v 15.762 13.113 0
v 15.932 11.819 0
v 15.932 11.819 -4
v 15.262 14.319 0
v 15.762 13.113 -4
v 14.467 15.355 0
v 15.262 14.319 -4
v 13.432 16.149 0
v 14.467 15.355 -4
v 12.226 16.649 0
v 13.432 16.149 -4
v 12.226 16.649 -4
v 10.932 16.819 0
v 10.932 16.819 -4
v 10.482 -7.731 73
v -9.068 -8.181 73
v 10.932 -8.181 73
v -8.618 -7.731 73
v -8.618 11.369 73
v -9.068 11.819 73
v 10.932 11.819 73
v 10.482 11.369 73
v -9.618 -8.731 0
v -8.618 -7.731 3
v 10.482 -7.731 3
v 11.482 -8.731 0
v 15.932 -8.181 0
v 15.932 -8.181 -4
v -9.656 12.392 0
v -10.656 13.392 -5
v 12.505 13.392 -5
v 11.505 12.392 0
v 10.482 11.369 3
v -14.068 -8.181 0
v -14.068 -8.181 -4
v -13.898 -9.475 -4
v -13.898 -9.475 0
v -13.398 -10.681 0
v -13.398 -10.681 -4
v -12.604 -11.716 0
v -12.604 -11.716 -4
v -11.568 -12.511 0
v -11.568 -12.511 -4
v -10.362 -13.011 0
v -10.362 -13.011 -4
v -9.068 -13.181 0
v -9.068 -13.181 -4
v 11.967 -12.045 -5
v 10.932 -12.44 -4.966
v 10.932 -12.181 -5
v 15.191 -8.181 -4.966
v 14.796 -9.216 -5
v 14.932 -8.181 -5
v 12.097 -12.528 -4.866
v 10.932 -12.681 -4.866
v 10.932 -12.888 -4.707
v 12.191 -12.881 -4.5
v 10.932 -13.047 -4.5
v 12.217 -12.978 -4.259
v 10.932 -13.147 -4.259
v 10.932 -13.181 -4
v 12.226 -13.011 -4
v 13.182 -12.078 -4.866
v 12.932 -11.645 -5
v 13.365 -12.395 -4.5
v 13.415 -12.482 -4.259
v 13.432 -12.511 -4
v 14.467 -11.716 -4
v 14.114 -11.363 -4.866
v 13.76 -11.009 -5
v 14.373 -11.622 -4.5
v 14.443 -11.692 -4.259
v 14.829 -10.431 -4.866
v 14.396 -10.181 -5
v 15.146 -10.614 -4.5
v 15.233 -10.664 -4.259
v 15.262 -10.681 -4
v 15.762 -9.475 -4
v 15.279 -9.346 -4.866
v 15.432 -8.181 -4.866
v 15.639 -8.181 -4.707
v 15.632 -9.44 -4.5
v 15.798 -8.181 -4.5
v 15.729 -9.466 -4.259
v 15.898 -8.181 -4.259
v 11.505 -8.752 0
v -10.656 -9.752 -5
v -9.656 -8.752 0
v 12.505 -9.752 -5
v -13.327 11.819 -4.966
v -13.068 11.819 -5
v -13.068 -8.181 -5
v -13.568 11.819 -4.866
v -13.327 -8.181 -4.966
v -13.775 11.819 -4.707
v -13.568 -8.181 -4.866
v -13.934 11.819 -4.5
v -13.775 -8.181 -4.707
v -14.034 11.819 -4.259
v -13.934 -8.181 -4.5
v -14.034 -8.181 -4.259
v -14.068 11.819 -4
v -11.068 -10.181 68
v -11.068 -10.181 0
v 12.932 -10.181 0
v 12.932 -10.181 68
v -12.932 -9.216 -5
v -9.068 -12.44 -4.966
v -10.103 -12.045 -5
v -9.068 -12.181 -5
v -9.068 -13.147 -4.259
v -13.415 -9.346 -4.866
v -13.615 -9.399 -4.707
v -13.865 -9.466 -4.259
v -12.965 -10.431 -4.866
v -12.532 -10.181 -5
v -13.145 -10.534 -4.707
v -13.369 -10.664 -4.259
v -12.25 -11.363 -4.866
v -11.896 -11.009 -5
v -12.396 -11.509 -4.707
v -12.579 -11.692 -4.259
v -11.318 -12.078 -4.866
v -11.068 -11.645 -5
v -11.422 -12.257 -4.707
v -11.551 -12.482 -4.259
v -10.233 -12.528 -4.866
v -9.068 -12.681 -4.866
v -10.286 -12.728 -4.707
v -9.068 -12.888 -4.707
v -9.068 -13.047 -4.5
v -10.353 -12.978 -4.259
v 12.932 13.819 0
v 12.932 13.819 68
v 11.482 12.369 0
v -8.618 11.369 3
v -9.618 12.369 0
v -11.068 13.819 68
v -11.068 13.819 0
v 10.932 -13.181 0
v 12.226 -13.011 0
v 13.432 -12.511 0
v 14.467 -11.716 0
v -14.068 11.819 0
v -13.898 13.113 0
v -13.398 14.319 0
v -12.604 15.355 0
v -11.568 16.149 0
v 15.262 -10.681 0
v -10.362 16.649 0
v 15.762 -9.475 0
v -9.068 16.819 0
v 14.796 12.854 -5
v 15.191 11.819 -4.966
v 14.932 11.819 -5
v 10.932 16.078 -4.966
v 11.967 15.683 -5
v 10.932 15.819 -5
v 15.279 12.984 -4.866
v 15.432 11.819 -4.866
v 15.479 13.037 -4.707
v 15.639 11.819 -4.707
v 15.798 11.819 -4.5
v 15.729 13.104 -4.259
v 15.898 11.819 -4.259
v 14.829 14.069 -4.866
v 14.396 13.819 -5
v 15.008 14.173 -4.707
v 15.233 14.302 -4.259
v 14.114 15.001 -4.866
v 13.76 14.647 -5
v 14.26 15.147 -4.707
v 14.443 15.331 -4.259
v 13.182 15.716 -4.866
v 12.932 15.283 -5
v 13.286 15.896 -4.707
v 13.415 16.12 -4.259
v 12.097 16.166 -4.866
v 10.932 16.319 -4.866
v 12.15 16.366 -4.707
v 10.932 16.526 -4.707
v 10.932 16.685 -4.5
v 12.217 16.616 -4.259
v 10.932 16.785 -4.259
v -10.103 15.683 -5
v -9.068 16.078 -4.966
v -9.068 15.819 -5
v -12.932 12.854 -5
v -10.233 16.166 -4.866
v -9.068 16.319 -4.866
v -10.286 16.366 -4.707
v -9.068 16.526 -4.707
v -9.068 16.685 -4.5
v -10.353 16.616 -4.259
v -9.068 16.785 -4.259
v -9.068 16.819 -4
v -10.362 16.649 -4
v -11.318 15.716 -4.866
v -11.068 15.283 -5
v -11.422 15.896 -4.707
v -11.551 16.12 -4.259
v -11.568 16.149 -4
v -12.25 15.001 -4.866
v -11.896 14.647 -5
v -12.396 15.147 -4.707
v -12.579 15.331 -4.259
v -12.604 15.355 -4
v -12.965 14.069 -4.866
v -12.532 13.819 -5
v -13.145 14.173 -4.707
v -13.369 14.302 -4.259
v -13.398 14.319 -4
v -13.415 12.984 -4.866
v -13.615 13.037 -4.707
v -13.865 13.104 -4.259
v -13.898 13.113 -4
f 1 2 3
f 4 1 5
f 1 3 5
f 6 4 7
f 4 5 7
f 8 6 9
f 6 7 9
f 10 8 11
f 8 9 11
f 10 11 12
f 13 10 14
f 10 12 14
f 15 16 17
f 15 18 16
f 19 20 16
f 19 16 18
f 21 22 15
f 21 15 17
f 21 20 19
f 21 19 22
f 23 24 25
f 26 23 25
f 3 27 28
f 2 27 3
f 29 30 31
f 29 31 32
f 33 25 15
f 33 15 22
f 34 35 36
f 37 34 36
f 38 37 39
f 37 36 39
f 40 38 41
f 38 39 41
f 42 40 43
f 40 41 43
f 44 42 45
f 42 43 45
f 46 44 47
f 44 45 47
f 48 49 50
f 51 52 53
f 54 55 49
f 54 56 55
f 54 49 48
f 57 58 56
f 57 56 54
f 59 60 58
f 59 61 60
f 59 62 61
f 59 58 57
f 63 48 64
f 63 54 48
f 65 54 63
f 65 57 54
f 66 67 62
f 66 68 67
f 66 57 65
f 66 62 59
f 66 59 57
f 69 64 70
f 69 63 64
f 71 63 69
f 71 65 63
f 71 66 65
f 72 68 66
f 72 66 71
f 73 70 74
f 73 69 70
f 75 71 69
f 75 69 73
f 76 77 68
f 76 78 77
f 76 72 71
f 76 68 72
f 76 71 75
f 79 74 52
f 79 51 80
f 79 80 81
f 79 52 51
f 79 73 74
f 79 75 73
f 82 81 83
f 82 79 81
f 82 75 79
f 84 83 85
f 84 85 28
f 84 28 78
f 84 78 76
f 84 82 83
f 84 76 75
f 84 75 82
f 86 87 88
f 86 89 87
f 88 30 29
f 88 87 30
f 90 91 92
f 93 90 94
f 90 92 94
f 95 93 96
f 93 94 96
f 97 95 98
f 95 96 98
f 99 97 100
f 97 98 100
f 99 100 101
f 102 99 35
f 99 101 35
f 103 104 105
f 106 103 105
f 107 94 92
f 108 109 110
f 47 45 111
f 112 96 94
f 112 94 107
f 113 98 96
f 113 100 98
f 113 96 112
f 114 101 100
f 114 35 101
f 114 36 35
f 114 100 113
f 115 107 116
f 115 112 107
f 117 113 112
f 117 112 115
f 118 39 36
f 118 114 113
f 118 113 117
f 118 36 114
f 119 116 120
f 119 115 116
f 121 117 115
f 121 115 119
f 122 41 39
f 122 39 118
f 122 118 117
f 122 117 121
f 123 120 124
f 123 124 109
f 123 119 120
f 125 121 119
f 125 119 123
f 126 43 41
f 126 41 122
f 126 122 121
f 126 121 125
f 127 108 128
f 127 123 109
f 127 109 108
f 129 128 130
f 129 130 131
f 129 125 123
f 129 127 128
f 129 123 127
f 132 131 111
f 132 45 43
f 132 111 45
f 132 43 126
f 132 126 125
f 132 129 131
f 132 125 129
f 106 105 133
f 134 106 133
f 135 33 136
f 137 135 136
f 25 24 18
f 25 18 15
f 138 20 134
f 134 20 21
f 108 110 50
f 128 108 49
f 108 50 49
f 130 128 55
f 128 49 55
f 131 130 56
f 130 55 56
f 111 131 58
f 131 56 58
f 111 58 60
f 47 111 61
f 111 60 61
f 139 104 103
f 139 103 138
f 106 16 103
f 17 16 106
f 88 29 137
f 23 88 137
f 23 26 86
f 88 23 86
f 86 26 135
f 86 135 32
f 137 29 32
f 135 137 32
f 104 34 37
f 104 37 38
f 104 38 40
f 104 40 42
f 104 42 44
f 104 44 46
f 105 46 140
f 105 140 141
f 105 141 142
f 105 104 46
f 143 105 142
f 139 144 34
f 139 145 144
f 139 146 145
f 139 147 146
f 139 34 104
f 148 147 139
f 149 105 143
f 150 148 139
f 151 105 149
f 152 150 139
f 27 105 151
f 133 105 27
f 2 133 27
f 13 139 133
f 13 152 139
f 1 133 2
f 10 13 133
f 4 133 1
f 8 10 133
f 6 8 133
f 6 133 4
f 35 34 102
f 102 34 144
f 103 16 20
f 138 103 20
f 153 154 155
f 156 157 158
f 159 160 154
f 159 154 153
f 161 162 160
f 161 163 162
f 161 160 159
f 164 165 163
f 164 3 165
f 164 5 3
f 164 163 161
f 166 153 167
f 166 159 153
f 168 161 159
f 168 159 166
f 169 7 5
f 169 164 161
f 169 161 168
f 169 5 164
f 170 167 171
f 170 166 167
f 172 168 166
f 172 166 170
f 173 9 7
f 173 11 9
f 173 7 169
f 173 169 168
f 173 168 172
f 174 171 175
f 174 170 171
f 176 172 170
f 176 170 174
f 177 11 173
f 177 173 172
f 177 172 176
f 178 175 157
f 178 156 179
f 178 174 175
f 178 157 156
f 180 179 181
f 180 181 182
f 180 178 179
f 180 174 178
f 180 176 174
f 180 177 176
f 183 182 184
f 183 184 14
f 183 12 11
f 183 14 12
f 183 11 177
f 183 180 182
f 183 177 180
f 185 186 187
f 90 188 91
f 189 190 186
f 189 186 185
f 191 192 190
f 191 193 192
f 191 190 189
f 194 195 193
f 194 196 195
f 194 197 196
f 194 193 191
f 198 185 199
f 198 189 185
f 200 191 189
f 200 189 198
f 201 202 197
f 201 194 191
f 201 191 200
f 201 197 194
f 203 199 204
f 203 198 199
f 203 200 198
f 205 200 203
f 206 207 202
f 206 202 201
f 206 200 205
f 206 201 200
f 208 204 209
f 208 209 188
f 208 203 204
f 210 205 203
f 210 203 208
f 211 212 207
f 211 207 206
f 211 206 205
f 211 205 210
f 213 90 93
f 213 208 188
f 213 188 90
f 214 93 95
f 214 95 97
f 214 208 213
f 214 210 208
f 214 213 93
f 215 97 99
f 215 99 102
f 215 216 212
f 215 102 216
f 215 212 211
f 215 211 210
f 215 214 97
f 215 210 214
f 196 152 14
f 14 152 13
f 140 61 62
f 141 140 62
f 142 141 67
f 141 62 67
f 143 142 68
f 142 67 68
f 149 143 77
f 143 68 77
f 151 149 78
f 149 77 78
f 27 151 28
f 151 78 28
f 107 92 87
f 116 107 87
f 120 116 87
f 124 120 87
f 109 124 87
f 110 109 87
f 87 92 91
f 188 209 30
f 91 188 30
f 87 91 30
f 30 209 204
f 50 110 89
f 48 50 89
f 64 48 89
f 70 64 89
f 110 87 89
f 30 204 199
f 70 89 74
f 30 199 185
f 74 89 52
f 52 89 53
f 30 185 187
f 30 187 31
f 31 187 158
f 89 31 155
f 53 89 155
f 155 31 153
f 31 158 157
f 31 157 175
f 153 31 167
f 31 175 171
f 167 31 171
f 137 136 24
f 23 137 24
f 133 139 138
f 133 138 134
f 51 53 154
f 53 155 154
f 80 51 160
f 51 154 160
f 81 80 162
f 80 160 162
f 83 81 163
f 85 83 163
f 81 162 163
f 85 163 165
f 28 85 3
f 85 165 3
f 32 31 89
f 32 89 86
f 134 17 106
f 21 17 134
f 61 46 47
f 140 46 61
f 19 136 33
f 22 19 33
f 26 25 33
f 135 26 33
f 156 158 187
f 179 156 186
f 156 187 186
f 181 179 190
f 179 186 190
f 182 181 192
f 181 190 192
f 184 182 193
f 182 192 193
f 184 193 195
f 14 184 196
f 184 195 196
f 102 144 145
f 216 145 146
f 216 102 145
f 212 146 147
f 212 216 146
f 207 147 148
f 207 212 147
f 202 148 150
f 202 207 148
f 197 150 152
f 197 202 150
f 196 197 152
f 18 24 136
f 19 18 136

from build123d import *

# Parameters (mm, degrees)
F0_W         = 24
F0_H         = 24
F0_W_2       = 19.1
F0_H_2       = 19.1
F1_DEPTH     = 73
F2_W         = 30
F2_H         = 30
F2_W_2       = 19.1615689546
F2_H_2       = 19.1443199292
F3_DEPTH     = 5
F4_T4_DEPTH  = 19.1615689546
F4_T9_DEPTH  = 19.1443199292
F4_T14_DEPTH = 19.1615689546
F4_T19_DEPTH = 19.1443199292
F4_T25_DEPTH = 45.1428898176
F4_T30_DEPTH = 45.1256407922
F4_T38_DEPTH = 45.1428898176
F4_T43_DEPTH = 45.1256407922
F4_T51_DEPTH = 45.1428898176
F4_T56_DEPTH = 45.1256407922
F4_T64_DEPTH = 45.1256407922
F4_T69_DEPTH = 45.1428898176
F5_SIZE2     = 3
F5_SIZE      = 1
F6_R         = 5
F7_R         = 1
F8_SIZE2     = 2
F8_SIZE      = 5


# Not quite as in the source:
# - a fillet or chamfer that OpenCascade refuses, or shapes differently, is made with other operations: its cross-section is extruded or revolved along the edge and cut away or added


with BuildPart() as f1:
    # F0 (on Top) → F1 (new body)
    with BuildSketch(Plane.XY):
        with Locations((0.93195308, 1.8190721235)):
            Rectangle(F0_W, F0_H)
        with Locations((0.93195308, 1.8190721235)):
            Rectangle(F0_W_2, F0_H_2, mode=Mode.SUBTRACT)
    extrude(amount=F1_DEPTH)

    # F2 (on Top) → F3 (join)
    with BuildSketch(Plane.XY):
        with Locations((0.93195308, 1.8190721235)):
            Rectangle(F2_W, F2_H)
        with Locations((0.9246049449, 1.8198941834)):
            Rectangle(F2_W_2, F2_H_2, mode=Mode.SUBTRACT)
    extrude(amount=-F3_DEPTH)

    # F4: chamfer of 2 x 10 on 4 edges, made by hand


with BuildPart() as f4_tool2:
    # F4_s3 → F4_t4 (new body)
    with BuildSketch(Plane.YZ.offset(10.5053894222)):
        with BuildLine():
            Line((-9.8307122352, -5.3922322703), (-7.6738193271, 5.3922322703))
            Line((-7.6738193271, 5.3922322703), (-7.4738193271, 5.3922322703))
            ThreePointArc((-7.4738193271, 5.3922322703), (-7.5522657812, 0.1961161351), (-7.5522657812, -5))
            Line((-7.5522657812, -5), (-7.7522657812, -5.2))
            ThreePointArc((-7.7522657812, -5.2), (-8.7914890082, -5.2), (-9.8307122352, -5.5922322703))
            Line((-9.8307122352, -5.5922322703), (-9.8307122352, -5.3922322703))
        make_face()
    extrude(amount=-F4_T4_DEPTH)

    split(bisect_by=Plane.XY, keep=Keep.BOTTOM)


with BuildPart() as f1_1:
    add(f1.part)

    # F4_t1: cut F4_tool2
    add(f4_tool2.part, mode=Mode.SUBTRACT)


with BuildPart() as f4_tool7:
    # F4_s8 → F4_t9 (new body)
    with BuildSketch(Plane.XZ.offset(-11.392054148)):
        with BuildLine():
            Line((12.5838358762, -5.3922322703), (10.4269429681, 5.3922322703))
            Line((10.4269429681, 5.3922322703), (10.2269429681, 5.3922322703))
            ThreePointArc((10.2269429681, 5.3922322703), (10.3053894222, 0.1961161351), (10.3053894222, -5))
            Line((10.3053894222, -5), (10.5053894222, -5.2))
            ThreePointArc((10.5053894222, -5.2), (11.5446126492, -5.2), (12.5838358762, -5.5922322703))
            Line((12.5838358762, -5.5922322703), (12.5838358762, -5.3922322703))
        make_face()
    extrude(amount=F4_T9_DEPTH)

    split(bisect_by=Plane.XY, keep=Keep.BOTTOM)


with BuildPart() as f1_2:
    add(f1_1.part)

    # F4_t6: cut F4_tool7
    add(f4_tool7.part, mode=Mode.SUBTRACT)


with BuildPart() as f4_tool12:
    # F4_s13 → F4_t14 (new body)
    with BuildSketch(Plane.YZ.offset(-8.6561795324)):
        with BuildLine():
            Line((13.4705006021, -5.3922322703), (11.313607694, 5.3922322703))
            Line((11.313607694, 5.3922322703), (11.113607694, 5.3922322703))
            ThreePointArc((11.113607694, 5.3922322703), (11.192054148, 0.1961161351), (11.192054148, -5))
            Line((11.192054148, -5), (11.392054148, -5.2))
            ThreePointArc((11.392054148, -5.2), (12.431277375, -5.2), (13.4705006021, -5.5922322703))
            Line((13.4705006021, -5.5922322703), (13.4705006021, -5.3922322703))
        make_face()
    extrude(amount=F4_T14_DEPTH)

    split(bisect_by=Plane.XY, keep=Keep.BOTTOM)


with BuildPart() as f1_3:
    add(f1_2.part)

    # F4_t11: cut F4_tool12
    add(f4_tool12.part, mode=Mode.SUBTRACT)


with BuildPart() as f4_tool17:
    # F4_s18 → F4_t19 (new body)
    with BuildSketch(Plane.XZ.offset(7.7522657812)):
        with BuildLine():
            Line((-10.7346259865, -5.3922322703), (-8.5777330784, 5.3922322703))
            Line((-8.5777330784, 5.3922322703), (-8.3777330784, 5.3922322703))
            ThreePointArc((-8.3777330784, 5.3922322703), (-8.4561795324, 0.1961161351), (-8.4561795324, -5))
            Line((-8.4561795324, -5), (-8.6561795324, -5.2))
            ThreePointArc((-8.6561795324, -5.2), (-9.6954027594, -5.2), (-10.7346259865, -5.5922322703))
            Line((-10.7346259865, -5.5922322703), (-10.7346259865, -5.3922322703))
        make_face()
    extrude(amount=-F4_T19_DEPTH)

    split(bisect_by=Plane.XY, keep=Keep.BOTTOM)


with BuildPart() as f1_4:
    add(f1_3.part)

    # F4_t16: cut F4_tool17
    add(f4_tool17.part, mode=Mode.SUBTRACT)


with BuildPart() as f4_tool23:
    # F4_s24 → F4_t25 (new body)
    with BuildSketch(Plane.YZ.offset(36.4867102851)):
        with BuildLine():
            Line((-9.8307122352, -5.3922322703), (-7.6738193271, 5.3922322703))
            Line((-7.6738193271, 5.3922322703), (-7.4738193271, 5.3922322703))
            ThreePointArc((-7.4738193271, 5.3922322703), (-7.5522657812, 0.1961161351), (-7.5522657812, -5))
            Line((-7.5522657812, -5), (-7.7522657812, -5.2))
            ThreePointArc((-7.7522657812, -5.2), (-8.7914890082, -5.2), (-9.8307122352, -5.5922322703))
            Line((-9.8307122352, -5.5922322703), (-9.8307122352, -5.3922322703))
        make_face()
    extrude(amount=-F4_T25_DEPTH)

    split(bisect_by=Plane.XY, keep=Keep.BOTTOM)

    split(bisect_by=Plane.YZ.offset(10.5053894222), keep=Keep.TOP)


with BuildPart() as f4_tool28:
    # F4_s29 → F4_t30 (new body)
    with BuildSketch(Plane.XZ.offset(-11.392054148)):
        with BuildLine():
            Line((12.5838358762, -5.3922322703), (10.4269429681, 5.3922322703))
            Line((10.4269429681, 5.3922322703), (10.2269429681, 5.3922322703))
            ThreePointArc((10.2269429681, 5.3922322703), (10.3053894222, 0.1961161351), (10.3053894222, -5))
            Line((10.3053894222, -5), (10.5053894222, -5.2))
            ThreePointArc((10.5053894222, -5.2), (11.5446126492, -5.2), (12.5838358762, -5.5922322703))
            Line((12.5838358762, -5.5922322703), (12.5838358762, -5.3922322703))
        make_face()
    extrude(amount=F4_T30_DEPTH)

    split(bisect_by=Plane.XY, keep=Keep.BOTTOM)

    split(bisect_by=Plane.XZ.offset(7.7522657812), keep=Keep.TOP)


with BuildPart() as f4_tool23_1:
    add(f4_tool23.part)

    # F4_t33: intersect F4_tool28
    add(f4_tool28.part, mode=Mode.INTERSECT)


with BuildPart() as f1_5:
    add(f1_4.part)

    # F4_t21: cut F4_tool23
    add(f4_tool23_1.part, mode=Mode.SUBTRACT)


with BuildPart() as f4_tool36:
    # F4_s37 → F4_t38 (new body)
    with BuildSketch(Plane.YZ.offset(10.5053894222)):
        with BuildLine():
            Line((-9.8307122352, -5.3922322703), (-7.6738193271, 5.3922322703))
            Line((-7.6738193271, 5.3922322703), (-7.4738193271, 5.3922322703))
            ThreePointArc((-7.4738193271, 5.3922322703), (-7.5522657812, 0.1961161351), (-7.5522657812, -5))
            Line((-7.5522657812, -5), (-7.7522657812, -5.2))
            ThreePointArc((-7.7522657812, -5.2), (-8.7914890082, -5.2), (-9.8307122352, -5.5922322703))
            Line((-9.8307122352, -5.5922322703), (-9.8307122352, -5.3922322703))
        make_face()
    extrude(amount=-F4_T38_DEPTH)

    split(bisect_by=Plane.XY, keep=Keep.BOTTOM)

    split(bisect_by=Plane.YZ.offset(-8.6561795324), keep=Keep.BOTTOM)


with BuildPart() as f4_tool41:
    # F4_s42 → F4_t43 (new body)
    with BuildSketch(Plane.XZ.offset(33.7335866441)):
        with BuildLine():
            Line((-10.7346259865, -5.3922322703), (-8.5777330784, 5.3922322703))
            Line((-8.5777330784, 5.3922322703), (-8.3777330784, 5.3922322703))
            ThreePointArc((-8.3777330784, 5.3922322703), (-8.4561795324, 0.1961161351), (-8.4561795324, -5))
            Line((-8.4561795324, -5), (-8.6561795324, -5.2))
            ThreePointArc((-8.6561795324, -5.2), (-9.6954027594, -5.2), (-10.7346259865, -5.5922322703))
            Line((-10.7346259865, -5.5922322703), (-10.7346259865, -5.3922322703))
        make_face()
    extrude(amount=-F4_T43_DEPTH)

    split(bisect_by=Plane.XY, keep=Keep.BOTTOM)

    split(bisect_by=Plane.XZ.offset(7.7522657812), keep=Keep.TOP)


with BuildPart() as f4_tool36_1:
    add(f4_tool36.part)

    # F4_t46: intersect F4_tool41
    add(f4_tool41.part, mode=Mode.INTERSECT)


with BuildPart() as f1_6:
    add(f1_5.part)

    # F4_t34: cut F4_tool36
    add(f4_tool36_1.part, mode=Mode.SUBTRACT)


with BuildPart() as f4_tool49:
    # F4_s50 → F4_t51 (new body)
    with BuildSketch(Plane.YZ.offset(-8.6561795324)):
        with BuildLine():
            Line((13.4705006021, -5.3922322703), (11.313607694, 5.3922322703))
            Line((11.313607694, 5.3922322703), (11.113607694, 5.3922322703))
            ThreePointArc((11.113607694, 5.3922322703), (11.192054148, 0.1961161351), (11.192054148, -5))
            Line((11.192054148, -5), (11.392054148, -5.2))
            ThreePointArc((11.392054148, -5.2), (12.431277375, -5.2), (13.4705006021, -5.5922322703))
            Line((13.4705006021, -5.5922322703), (13.4705006021, -5.3922322703))
        make_face()
    extrude(amount=F4_T51_DEPTH)

    split(bisect_by=Plane.XY, keep=Keep.BOTTOM)

    split(bisect_by=Plane.YZ.offset(10.5053894222), keep=Keep.TOP)


with BuildPart() as f4_tool54:
    # F4_s55 → F4_t56 (new body)
    with BuildSketch(Plane.XZ.offset(-37.373375011)):
        with BuildLine():
            Line((12.5838358762, -5.3922322703), (10.4269429681, 5.3922322703))
            Line((10.4269429681, 5.3922322703), (10.2269429681, 5.3922322703))
            ThreePointArc((10.2269429681, 5.3922322703), (10.3053894222, 0.1961161351), (10.3053894222, -5))
            Line((10.3053894222, -5), (10.5053894222, -5.2))
            ThreePointArc((10.5053894222, -5.2), (11.5446126492, -5.2), (12.5838358762, -5.5922322703))
            Line((12.5838358762, -5.5922322703), (12.5838358762, -5.3922322703))
        make_face()
    extrude(amount=F4_T56_DEPTH)

    split(bisect_by=Plane.XY, keep=Keep.BOTTOM)

    split(bisect_by=Plane.XZ.offset(-11.392054148), keep=Keep.BOTTOM)


with BuildPart() as f4_tool49_1:
    add(f4_tool49.part)

    # F4_t59: intersect F4_tool54
    add(f4_tool54.part, mode=Mode.INTERSECT)


with BuildPart() as f1_7:
    add(f1_6.part)

    # F4_t47: cut F4_tool49
    add(f4_tool49_1.part, mode=Mode.SUBTRACT)


with BuildPart() as f4_tool62:
    # F4_s63 → F4_t64 (new body)
    with BuildSketch(Plane.XZ.offset(7.7522657812)):
        with BuildLine():
            Line((-10.7346259865, -5.3922322703), (-8.5777330784, 5.3922322703))
            Line((-8.5777330784, 5.3922322703), (-8.3777330784, 5.3922322703))
            ThreePointArc((-8.3777330784, 5.3922322703), (-8.4561795324, 0.1961161351), (-8.4561795324, -5))
            Line((-8.4561795324, -5), (-8.6561795324, -5.2))
            ThreePointArc((-8.6561795324, -5.2), (-9.6954027594, -5.2), (-10.7346259865, -5.5922322703))
            Line((-10.7346259865, -5.5922322703), (-10.7346259865, -5.3922322703))
        make_face()
    extrude(amount=-F4_T64_DEPTH)

    split(bisect_by=Plane.XY, keep=Keep.BOTTOM)

    split(bisect_by=Plane.XZ.offset(-11.392054148), keep=Keep.BOTTOM)


with BuildPart() as f4_tool67:
    # F4_s68 → F4_t69 (new body)
    with BuildSketch(Plane.YZ.offset(-34.6375003954)):
        with BuildLine():
            Line((13.4705006021, -5.3922322703), (11.313607694, 5.3922322703))
            Line((11.313607694, 5.3922322703), (11.113607694, 5.3922322703))
            ThreePointArc((11.113607694, 5.3922322703), (11.192054148, 0.1961161351), (11.192054148, -5))
            Line((11.192054148, -5), (11.392054148, -5.2))
            ThreePointArc((11.392054148, -5.2), (12.431277375, -5.2), (13.4705006021, -5.5922322703))
            Line((13.4705006021, -5.5922322703), (13.4705006021, -5.3922322703))
        make_face()
    extrude(amount=F4_T69_DEPTH)

    split(bisect_by=Plane.XY, keep=Keep.BOTTOM)

    split(bisect_by=Plane.YZ.offset(-8.6561795324), keep=Keep.BOTTOM)


with BuildPart() as f4_tool62_1:
    add(f4_tool62.part)

    # F4_t72: intersect F4_tool67
    add(f4_tool67.part, mode=Mode.INTERSECT)


with BuildPart() as f1_8:
    add(f1_7.part)

    # F4_t60: cut F4_tool62
    add(f4_tool62_1.part, mode=Mode.SUBTRACT)

    # F5
    f5_edges = [f1_8.edges().sort_by_distance(p)[0] for p in [
        (0.931953, -7.730928, 0),
        (10.481953, 1.819072, 0),
        (0.931953, 11.369072, 0),
        (-8.618047, 1.819072, 0),
    ]]
    f5_side = f1_8.faces().sort_by_distance((0.931953, 11.66822, 0))[0]
    chamfer(f5_edges, length=F5_SIZE, length2=F5_SIZE2, reference=f5_side)

    # F6
    f6_edges = [f1_8.edges().sort_by_distance(p)[0] for p in [
        (-14.068047, 16.819072, -2.5),
        (15.931953, 16.819072, -2.5),
        (15.931953, -13.180928, -2.5),
        (-14.068047, -13.180928, -2.5),
    ]]
    fillet(f6_edges, radius=F6_R)

    # F7
    f7_edges = [f1_8.edges().sort_by_distance(p)[0] for p in [
        (15.931953, 1.819072, -5),
        (14.467487, -11.716462, -5),
        (0.931953, -13.180928, -5),
        (-14.068047, 1.819072, -5),
        (-12.603581, 15.354606, -5),
        (-12.603581, -11.716462, -5),
        (0.931953, 16.819072, -5),
        (14.467487, 15.354606, -5),
    ]]
    fillet(f7_edges, radius=F7_R)

    # F8
    f8_edges = [f1_8.edges().sort_by_distance(p)[0] for p in [
        (0.931953, 13.819072, 73),
        (12.931953, 1.819072, 73),
        (0.931953, -10.180928, 73),
        (-11.068047, 1.819072, 73),
    ]]
    chamfer(f8_edges, length=F8_SIZE, length2=F8_SIZE2)


solid = f1_8.part
